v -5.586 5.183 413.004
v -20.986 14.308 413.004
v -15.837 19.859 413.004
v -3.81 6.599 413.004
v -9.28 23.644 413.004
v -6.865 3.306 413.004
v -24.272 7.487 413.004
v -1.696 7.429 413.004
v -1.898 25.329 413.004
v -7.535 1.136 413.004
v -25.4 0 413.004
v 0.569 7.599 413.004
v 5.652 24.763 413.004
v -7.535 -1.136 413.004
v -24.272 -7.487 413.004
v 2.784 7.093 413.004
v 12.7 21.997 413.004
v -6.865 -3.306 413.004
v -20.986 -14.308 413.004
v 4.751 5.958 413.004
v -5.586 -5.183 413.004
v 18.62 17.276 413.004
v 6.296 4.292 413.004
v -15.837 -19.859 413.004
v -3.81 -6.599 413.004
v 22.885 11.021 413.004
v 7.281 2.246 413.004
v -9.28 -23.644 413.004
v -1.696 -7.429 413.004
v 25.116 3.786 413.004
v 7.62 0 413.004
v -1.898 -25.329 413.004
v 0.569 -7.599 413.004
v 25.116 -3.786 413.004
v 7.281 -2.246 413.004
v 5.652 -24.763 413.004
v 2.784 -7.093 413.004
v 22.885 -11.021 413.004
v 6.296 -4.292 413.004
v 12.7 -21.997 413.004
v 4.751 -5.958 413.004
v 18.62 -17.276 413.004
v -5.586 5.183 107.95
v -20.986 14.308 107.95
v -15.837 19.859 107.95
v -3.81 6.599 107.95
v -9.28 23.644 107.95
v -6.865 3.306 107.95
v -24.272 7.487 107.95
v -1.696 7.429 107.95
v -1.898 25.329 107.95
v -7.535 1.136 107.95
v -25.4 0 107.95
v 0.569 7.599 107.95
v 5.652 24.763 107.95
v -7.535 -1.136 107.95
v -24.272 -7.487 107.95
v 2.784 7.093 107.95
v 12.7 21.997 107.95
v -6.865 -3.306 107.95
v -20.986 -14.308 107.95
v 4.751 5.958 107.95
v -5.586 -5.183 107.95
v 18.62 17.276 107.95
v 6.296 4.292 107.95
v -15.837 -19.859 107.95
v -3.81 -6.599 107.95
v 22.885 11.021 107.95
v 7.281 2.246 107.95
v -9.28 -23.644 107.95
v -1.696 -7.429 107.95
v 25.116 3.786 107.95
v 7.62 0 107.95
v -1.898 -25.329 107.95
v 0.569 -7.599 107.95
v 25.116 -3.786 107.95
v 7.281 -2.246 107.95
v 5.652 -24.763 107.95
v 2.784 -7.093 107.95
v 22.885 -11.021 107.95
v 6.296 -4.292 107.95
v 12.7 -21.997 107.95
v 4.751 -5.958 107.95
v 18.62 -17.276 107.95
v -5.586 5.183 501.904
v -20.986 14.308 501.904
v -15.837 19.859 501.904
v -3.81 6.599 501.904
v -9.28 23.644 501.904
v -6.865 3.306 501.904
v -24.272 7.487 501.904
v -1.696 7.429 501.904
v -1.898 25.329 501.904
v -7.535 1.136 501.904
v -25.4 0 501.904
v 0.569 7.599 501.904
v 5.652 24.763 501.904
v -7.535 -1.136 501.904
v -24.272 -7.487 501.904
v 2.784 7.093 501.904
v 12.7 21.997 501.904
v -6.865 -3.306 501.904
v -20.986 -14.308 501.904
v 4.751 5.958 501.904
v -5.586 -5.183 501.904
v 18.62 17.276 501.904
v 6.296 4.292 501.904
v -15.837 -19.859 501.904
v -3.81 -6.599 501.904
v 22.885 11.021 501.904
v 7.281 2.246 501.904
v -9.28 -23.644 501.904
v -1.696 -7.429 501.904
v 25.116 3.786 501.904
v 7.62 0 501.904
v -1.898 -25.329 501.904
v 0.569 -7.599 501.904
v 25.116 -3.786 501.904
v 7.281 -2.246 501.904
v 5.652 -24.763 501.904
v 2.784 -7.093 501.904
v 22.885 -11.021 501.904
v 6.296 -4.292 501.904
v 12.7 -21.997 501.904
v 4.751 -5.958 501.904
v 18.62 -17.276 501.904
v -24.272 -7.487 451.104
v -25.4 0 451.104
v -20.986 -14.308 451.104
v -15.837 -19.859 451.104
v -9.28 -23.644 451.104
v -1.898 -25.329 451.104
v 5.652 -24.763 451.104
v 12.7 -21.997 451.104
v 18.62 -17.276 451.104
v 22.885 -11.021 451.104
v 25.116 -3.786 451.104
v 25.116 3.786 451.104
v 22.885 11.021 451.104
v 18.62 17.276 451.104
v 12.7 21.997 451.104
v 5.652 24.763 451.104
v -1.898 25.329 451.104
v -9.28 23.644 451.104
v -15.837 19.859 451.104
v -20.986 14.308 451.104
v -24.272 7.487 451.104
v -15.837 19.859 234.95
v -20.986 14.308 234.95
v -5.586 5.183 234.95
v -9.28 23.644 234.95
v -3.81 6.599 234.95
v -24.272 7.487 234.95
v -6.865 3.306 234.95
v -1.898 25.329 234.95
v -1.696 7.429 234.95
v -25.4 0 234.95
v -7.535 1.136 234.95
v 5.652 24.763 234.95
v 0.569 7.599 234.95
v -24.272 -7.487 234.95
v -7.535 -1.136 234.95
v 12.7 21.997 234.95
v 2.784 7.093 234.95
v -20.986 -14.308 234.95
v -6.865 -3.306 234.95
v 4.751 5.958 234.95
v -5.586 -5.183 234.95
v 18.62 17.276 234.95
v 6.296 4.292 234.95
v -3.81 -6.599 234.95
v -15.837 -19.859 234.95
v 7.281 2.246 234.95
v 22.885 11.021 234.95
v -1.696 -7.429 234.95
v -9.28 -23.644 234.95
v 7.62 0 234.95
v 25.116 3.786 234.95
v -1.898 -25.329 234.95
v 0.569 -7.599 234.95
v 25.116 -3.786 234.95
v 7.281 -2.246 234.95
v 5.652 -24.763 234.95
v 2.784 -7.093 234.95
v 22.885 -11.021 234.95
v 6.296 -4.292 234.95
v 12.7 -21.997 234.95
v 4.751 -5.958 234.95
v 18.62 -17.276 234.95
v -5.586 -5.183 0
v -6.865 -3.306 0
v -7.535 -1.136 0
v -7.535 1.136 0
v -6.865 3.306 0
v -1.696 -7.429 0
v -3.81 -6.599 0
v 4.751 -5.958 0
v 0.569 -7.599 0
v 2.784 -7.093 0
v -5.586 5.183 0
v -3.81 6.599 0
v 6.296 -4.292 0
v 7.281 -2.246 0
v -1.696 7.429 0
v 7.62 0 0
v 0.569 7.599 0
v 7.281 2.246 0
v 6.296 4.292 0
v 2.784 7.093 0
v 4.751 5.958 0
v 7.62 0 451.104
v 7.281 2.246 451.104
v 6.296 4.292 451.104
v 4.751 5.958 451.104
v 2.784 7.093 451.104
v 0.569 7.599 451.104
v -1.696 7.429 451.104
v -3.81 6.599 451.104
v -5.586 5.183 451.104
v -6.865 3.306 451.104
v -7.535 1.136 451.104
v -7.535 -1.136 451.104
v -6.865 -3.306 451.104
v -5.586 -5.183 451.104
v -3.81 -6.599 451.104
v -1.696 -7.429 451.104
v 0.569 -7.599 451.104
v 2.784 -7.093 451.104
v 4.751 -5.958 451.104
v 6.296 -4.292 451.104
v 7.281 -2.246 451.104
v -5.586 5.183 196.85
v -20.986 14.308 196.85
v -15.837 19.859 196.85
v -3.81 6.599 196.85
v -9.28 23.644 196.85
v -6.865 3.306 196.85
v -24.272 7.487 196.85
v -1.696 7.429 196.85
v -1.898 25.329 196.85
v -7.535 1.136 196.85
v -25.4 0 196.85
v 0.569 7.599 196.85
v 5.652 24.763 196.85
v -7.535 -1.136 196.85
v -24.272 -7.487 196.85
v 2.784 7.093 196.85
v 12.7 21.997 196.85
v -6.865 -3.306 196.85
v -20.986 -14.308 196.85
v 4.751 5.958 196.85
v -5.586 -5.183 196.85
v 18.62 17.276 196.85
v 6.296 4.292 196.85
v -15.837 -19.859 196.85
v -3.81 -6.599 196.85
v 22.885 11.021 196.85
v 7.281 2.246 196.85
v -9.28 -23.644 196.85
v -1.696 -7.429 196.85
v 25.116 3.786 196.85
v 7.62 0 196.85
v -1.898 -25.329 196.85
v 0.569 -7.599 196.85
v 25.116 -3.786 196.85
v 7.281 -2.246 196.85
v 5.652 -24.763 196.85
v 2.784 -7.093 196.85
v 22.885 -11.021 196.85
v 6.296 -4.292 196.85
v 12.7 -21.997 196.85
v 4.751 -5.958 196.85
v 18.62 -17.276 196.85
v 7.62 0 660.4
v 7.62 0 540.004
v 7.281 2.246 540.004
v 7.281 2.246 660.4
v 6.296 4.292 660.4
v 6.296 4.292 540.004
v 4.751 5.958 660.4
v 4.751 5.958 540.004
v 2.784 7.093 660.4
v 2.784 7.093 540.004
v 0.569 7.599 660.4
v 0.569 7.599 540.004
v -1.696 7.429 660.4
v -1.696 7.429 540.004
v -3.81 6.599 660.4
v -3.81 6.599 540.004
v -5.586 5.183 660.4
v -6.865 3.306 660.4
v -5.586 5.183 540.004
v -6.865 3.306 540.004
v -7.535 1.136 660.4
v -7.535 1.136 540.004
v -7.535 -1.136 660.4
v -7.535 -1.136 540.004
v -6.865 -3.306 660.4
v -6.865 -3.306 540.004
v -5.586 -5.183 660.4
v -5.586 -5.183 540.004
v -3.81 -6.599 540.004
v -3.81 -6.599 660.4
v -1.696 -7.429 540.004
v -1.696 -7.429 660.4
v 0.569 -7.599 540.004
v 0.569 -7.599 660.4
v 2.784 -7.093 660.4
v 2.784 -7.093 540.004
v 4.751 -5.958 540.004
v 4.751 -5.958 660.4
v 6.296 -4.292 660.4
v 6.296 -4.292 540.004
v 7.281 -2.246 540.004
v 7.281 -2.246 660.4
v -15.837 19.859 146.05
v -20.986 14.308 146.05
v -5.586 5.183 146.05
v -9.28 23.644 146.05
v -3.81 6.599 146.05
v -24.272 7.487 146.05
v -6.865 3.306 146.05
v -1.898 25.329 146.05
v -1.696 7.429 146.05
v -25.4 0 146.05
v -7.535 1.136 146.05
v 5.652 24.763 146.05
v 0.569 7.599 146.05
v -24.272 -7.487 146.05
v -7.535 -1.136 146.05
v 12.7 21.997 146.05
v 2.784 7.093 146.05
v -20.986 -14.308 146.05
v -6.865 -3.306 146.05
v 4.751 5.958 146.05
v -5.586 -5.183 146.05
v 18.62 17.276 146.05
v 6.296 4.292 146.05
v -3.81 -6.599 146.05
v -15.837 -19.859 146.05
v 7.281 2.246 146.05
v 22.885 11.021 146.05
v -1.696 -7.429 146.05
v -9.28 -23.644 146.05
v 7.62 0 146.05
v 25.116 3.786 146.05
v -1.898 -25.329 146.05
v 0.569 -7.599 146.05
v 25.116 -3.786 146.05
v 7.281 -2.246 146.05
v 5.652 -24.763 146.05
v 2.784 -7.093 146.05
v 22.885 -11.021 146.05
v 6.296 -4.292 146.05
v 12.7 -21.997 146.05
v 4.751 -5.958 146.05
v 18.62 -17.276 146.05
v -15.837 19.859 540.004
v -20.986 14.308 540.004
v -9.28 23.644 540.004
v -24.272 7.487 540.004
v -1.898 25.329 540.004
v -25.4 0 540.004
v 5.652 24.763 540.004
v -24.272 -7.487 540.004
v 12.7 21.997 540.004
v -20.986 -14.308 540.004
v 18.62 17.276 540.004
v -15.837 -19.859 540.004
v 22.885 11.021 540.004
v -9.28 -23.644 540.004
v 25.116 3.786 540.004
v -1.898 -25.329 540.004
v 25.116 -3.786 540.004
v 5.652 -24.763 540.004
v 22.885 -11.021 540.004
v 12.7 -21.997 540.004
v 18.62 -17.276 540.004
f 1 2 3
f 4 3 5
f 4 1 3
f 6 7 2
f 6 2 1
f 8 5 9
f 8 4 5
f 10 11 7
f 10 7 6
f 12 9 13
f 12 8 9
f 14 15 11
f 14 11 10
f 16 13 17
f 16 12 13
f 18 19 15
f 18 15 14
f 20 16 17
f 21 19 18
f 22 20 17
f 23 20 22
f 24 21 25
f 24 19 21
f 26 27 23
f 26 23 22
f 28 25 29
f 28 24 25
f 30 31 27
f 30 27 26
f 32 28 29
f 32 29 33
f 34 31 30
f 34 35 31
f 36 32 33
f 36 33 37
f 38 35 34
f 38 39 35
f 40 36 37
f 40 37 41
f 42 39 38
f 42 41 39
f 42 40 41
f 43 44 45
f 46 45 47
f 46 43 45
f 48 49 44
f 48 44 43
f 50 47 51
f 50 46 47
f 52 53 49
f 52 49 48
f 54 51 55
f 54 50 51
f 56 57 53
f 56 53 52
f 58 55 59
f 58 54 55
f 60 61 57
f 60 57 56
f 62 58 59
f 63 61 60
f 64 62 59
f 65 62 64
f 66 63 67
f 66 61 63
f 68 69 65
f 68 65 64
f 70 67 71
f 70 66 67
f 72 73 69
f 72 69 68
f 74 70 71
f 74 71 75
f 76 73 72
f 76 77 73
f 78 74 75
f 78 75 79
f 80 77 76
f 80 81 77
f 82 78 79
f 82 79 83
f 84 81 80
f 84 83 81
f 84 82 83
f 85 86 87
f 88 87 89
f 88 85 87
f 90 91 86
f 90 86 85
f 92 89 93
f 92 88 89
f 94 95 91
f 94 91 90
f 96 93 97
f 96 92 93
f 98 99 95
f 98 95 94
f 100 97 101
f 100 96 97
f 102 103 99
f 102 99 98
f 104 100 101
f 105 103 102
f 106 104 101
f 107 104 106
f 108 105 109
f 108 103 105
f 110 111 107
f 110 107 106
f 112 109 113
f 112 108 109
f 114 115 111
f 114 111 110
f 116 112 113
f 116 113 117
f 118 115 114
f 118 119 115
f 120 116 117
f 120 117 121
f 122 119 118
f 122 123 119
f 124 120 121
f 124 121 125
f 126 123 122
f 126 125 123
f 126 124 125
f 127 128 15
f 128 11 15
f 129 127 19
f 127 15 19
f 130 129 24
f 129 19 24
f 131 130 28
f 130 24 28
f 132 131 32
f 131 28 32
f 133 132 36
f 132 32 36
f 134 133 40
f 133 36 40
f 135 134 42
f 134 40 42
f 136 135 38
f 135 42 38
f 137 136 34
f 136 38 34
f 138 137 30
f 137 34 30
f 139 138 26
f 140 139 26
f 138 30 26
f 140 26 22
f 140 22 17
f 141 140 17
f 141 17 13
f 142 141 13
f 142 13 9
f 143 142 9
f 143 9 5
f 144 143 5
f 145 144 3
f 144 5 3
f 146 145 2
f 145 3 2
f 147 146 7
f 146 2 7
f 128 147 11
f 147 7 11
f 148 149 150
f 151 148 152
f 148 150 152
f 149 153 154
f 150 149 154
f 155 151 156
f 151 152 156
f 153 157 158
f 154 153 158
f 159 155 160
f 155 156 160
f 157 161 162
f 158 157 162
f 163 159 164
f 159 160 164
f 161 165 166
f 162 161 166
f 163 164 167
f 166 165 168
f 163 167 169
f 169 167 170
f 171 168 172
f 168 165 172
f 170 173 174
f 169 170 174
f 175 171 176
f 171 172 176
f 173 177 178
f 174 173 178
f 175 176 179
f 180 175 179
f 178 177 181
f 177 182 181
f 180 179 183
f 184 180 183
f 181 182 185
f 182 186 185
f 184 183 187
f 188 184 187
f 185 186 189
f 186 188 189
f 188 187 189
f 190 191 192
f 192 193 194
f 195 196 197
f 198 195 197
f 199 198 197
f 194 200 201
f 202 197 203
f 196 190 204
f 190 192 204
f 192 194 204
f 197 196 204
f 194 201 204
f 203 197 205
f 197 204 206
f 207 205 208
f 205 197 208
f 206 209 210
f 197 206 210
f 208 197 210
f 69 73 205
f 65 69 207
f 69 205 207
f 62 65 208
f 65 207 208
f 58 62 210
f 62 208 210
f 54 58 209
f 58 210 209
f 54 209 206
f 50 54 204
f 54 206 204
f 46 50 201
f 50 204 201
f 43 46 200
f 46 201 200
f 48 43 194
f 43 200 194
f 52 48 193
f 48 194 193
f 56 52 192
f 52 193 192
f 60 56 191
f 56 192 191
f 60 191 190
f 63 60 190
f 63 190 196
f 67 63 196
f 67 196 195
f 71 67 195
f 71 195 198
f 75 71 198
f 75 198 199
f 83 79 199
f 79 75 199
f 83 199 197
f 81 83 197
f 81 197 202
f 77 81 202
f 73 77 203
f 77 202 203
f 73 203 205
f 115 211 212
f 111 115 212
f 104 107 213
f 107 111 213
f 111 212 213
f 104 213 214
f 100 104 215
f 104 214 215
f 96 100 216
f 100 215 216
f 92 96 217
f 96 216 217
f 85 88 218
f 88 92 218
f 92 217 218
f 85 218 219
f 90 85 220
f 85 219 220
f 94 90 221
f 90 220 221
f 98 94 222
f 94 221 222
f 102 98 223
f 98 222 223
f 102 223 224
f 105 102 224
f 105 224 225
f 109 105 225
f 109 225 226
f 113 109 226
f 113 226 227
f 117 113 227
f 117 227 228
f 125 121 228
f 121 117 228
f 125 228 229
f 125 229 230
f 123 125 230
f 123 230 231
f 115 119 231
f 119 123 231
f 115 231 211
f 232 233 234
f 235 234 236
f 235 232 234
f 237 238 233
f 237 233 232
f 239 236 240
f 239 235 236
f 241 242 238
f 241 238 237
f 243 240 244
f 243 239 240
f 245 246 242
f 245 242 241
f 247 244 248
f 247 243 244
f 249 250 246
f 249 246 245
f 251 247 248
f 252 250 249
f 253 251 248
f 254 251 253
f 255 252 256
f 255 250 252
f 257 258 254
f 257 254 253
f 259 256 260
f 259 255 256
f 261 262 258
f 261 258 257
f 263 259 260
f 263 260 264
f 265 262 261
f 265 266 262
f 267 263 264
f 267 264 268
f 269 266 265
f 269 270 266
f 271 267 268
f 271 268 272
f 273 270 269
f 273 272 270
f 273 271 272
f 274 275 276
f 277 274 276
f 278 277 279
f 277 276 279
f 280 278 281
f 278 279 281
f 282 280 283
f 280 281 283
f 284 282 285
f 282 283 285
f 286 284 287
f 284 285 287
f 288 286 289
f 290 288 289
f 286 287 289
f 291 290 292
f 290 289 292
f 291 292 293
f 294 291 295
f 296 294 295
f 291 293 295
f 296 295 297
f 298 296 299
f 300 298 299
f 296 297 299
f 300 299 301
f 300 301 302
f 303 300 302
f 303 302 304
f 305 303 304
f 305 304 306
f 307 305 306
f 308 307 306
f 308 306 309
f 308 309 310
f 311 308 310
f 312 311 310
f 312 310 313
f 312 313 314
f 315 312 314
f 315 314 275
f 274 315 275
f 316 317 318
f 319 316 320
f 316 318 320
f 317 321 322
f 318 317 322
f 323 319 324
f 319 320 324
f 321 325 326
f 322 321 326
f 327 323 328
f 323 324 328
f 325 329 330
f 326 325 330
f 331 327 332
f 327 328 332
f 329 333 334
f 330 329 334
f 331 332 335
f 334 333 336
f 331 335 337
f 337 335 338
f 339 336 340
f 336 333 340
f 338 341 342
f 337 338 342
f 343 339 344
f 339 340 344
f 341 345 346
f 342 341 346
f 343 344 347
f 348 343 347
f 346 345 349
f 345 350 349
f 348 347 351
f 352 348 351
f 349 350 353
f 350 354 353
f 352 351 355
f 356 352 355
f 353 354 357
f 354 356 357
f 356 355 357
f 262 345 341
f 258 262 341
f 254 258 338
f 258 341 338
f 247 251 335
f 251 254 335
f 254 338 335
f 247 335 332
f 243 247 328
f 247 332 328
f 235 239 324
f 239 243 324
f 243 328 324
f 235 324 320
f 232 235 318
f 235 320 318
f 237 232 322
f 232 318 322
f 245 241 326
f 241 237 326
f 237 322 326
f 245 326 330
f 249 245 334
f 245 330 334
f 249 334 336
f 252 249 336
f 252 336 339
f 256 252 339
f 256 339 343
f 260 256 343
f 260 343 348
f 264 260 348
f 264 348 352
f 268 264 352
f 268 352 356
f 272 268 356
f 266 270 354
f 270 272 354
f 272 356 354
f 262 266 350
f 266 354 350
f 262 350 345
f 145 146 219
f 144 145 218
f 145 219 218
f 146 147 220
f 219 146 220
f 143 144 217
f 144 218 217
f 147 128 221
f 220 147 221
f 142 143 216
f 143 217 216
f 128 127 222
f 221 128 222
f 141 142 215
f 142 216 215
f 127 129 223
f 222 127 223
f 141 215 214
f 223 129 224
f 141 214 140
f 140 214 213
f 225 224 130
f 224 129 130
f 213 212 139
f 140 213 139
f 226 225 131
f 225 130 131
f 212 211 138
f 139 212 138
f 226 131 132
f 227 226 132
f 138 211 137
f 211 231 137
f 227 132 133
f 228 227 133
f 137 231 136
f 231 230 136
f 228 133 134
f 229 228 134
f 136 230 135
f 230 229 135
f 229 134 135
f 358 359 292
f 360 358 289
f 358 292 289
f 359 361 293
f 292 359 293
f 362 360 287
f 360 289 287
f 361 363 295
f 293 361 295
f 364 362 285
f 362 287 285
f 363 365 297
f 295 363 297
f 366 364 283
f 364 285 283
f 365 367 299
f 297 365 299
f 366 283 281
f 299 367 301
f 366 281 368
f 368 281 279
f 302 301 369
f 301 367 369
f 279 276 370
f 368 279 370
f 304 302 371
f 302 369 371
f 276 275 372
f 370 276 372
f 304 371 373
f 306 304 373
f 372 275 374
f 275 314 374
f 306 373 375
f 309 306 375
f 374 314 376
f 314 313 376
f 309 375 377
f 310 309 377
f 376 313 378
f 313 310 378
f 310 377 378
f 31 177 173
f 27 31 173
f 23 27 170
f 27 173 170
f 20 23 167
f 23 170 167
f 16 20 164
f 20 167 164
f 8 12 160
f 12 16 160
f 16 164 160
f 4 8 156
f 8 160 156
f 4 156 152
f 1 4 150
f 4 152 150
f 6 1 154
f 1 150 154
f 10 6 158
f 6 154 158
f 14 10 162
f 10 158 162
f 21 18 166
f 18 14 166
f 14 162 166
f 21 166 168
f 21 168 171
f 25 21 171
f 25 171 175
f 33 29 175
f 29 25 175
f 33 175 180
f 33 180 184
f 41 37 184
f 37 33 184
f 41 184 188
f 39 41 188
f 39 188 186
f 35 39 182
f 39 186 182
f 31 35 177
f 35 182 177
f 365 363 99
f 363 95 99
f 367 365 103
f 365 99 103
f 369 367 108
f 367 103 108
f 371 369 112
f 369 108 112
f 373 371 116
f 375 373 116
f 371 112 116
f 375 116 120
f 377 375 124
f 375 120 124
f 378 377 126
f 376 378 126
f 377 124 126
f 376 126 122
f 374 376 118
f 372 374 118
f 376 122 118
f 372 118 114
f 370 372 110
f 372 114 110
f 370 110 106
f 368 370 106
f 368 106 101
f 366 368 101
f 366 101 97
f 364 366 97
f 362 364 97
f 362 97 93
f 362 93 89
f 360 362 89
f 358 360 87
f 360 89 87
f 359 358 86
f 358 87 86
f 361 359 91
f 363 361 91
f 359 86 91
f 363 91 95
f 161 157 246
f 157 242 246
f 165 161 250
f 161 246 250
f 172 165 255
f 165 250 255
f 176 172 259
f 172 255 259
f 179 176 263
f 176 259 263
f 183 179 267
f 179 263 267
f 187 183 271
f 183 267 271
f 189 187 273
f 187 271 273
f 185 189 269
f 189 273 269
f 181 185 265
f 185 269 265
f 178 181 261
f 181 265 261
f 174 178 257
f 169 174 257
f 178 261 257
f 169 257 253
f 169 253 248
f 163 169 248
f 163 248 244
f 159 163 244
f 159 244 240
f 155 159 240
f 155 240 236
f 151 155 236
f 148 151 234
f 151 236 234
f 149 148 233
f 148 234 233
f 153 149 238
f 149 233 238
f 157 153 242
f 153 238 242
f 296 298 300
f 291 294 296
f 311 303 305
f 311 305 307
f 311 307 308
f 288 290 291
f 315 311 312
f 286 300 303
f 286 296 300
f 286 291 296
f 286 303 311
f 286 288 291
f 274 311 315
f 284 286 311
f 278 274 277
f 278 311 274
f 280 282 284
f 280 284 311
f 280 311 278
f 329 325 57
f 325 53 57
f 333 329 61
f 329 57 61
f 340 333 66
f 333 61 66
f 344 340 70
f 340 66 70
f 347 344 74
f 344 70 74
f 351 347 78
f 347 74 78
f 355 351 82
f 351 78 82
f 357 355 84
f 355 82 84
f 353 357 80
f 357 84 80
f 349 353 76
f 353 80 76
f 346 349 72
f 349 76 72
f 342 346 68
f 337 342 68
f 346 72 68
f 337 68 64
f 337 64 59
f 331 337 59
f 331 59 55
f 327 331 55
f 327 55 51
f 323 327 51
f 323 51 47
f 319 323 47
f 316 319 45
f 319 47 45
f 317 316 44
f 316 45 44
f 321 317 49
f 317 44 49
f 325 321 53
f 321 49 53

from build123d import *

# Parameters (mm, degrees)
SKETCH1_R           = 7.62
BOSS_EXTRUDE1_DEPTH = 660.4
SKETCH2_W           = 25.4
SKETCH2_H           = 38.1


with BuildPart() as part:
    # Sketch1 → Boss-Extrude1 (new body)
    with BuildSketch(Plane.XY):
        Circle(SKETCH1_R)
    extrude(amount=BOSS_EXTRUDE1_DEPTH)

    # Sketch2 → Revolve1 (revolve)
    with BuildSketch(Plane(origin=(0, 0, 0), x_dir=(1, 0, 0), z_dir=(0, 1, 0)), mode=Mode.PRIVATE) as revolve1_sk:
        with Locations((12.7, -127)):
            Rectangle(SKETCH2_W, SKETCH2_H)
        with Locations((12.7, -215.9)):
            Rectangle(SKETCH2_W, SKETCH2_H)
        with Locations((12.7, -432.054)):
            Rectangle(SKETCH2_W, SKETCH2_H)
        with Locations((12.7, -520.954)):
            Rectangle(SKETCH2_W, SKETCH2_H)
    revolve(revolve1_sk.sketch.rotate(Axis((0, 0, 0), (0, 0, 1)), 180), axis=Axis((0, 0, 0), (0, 0, 1)))


solid = part.part
